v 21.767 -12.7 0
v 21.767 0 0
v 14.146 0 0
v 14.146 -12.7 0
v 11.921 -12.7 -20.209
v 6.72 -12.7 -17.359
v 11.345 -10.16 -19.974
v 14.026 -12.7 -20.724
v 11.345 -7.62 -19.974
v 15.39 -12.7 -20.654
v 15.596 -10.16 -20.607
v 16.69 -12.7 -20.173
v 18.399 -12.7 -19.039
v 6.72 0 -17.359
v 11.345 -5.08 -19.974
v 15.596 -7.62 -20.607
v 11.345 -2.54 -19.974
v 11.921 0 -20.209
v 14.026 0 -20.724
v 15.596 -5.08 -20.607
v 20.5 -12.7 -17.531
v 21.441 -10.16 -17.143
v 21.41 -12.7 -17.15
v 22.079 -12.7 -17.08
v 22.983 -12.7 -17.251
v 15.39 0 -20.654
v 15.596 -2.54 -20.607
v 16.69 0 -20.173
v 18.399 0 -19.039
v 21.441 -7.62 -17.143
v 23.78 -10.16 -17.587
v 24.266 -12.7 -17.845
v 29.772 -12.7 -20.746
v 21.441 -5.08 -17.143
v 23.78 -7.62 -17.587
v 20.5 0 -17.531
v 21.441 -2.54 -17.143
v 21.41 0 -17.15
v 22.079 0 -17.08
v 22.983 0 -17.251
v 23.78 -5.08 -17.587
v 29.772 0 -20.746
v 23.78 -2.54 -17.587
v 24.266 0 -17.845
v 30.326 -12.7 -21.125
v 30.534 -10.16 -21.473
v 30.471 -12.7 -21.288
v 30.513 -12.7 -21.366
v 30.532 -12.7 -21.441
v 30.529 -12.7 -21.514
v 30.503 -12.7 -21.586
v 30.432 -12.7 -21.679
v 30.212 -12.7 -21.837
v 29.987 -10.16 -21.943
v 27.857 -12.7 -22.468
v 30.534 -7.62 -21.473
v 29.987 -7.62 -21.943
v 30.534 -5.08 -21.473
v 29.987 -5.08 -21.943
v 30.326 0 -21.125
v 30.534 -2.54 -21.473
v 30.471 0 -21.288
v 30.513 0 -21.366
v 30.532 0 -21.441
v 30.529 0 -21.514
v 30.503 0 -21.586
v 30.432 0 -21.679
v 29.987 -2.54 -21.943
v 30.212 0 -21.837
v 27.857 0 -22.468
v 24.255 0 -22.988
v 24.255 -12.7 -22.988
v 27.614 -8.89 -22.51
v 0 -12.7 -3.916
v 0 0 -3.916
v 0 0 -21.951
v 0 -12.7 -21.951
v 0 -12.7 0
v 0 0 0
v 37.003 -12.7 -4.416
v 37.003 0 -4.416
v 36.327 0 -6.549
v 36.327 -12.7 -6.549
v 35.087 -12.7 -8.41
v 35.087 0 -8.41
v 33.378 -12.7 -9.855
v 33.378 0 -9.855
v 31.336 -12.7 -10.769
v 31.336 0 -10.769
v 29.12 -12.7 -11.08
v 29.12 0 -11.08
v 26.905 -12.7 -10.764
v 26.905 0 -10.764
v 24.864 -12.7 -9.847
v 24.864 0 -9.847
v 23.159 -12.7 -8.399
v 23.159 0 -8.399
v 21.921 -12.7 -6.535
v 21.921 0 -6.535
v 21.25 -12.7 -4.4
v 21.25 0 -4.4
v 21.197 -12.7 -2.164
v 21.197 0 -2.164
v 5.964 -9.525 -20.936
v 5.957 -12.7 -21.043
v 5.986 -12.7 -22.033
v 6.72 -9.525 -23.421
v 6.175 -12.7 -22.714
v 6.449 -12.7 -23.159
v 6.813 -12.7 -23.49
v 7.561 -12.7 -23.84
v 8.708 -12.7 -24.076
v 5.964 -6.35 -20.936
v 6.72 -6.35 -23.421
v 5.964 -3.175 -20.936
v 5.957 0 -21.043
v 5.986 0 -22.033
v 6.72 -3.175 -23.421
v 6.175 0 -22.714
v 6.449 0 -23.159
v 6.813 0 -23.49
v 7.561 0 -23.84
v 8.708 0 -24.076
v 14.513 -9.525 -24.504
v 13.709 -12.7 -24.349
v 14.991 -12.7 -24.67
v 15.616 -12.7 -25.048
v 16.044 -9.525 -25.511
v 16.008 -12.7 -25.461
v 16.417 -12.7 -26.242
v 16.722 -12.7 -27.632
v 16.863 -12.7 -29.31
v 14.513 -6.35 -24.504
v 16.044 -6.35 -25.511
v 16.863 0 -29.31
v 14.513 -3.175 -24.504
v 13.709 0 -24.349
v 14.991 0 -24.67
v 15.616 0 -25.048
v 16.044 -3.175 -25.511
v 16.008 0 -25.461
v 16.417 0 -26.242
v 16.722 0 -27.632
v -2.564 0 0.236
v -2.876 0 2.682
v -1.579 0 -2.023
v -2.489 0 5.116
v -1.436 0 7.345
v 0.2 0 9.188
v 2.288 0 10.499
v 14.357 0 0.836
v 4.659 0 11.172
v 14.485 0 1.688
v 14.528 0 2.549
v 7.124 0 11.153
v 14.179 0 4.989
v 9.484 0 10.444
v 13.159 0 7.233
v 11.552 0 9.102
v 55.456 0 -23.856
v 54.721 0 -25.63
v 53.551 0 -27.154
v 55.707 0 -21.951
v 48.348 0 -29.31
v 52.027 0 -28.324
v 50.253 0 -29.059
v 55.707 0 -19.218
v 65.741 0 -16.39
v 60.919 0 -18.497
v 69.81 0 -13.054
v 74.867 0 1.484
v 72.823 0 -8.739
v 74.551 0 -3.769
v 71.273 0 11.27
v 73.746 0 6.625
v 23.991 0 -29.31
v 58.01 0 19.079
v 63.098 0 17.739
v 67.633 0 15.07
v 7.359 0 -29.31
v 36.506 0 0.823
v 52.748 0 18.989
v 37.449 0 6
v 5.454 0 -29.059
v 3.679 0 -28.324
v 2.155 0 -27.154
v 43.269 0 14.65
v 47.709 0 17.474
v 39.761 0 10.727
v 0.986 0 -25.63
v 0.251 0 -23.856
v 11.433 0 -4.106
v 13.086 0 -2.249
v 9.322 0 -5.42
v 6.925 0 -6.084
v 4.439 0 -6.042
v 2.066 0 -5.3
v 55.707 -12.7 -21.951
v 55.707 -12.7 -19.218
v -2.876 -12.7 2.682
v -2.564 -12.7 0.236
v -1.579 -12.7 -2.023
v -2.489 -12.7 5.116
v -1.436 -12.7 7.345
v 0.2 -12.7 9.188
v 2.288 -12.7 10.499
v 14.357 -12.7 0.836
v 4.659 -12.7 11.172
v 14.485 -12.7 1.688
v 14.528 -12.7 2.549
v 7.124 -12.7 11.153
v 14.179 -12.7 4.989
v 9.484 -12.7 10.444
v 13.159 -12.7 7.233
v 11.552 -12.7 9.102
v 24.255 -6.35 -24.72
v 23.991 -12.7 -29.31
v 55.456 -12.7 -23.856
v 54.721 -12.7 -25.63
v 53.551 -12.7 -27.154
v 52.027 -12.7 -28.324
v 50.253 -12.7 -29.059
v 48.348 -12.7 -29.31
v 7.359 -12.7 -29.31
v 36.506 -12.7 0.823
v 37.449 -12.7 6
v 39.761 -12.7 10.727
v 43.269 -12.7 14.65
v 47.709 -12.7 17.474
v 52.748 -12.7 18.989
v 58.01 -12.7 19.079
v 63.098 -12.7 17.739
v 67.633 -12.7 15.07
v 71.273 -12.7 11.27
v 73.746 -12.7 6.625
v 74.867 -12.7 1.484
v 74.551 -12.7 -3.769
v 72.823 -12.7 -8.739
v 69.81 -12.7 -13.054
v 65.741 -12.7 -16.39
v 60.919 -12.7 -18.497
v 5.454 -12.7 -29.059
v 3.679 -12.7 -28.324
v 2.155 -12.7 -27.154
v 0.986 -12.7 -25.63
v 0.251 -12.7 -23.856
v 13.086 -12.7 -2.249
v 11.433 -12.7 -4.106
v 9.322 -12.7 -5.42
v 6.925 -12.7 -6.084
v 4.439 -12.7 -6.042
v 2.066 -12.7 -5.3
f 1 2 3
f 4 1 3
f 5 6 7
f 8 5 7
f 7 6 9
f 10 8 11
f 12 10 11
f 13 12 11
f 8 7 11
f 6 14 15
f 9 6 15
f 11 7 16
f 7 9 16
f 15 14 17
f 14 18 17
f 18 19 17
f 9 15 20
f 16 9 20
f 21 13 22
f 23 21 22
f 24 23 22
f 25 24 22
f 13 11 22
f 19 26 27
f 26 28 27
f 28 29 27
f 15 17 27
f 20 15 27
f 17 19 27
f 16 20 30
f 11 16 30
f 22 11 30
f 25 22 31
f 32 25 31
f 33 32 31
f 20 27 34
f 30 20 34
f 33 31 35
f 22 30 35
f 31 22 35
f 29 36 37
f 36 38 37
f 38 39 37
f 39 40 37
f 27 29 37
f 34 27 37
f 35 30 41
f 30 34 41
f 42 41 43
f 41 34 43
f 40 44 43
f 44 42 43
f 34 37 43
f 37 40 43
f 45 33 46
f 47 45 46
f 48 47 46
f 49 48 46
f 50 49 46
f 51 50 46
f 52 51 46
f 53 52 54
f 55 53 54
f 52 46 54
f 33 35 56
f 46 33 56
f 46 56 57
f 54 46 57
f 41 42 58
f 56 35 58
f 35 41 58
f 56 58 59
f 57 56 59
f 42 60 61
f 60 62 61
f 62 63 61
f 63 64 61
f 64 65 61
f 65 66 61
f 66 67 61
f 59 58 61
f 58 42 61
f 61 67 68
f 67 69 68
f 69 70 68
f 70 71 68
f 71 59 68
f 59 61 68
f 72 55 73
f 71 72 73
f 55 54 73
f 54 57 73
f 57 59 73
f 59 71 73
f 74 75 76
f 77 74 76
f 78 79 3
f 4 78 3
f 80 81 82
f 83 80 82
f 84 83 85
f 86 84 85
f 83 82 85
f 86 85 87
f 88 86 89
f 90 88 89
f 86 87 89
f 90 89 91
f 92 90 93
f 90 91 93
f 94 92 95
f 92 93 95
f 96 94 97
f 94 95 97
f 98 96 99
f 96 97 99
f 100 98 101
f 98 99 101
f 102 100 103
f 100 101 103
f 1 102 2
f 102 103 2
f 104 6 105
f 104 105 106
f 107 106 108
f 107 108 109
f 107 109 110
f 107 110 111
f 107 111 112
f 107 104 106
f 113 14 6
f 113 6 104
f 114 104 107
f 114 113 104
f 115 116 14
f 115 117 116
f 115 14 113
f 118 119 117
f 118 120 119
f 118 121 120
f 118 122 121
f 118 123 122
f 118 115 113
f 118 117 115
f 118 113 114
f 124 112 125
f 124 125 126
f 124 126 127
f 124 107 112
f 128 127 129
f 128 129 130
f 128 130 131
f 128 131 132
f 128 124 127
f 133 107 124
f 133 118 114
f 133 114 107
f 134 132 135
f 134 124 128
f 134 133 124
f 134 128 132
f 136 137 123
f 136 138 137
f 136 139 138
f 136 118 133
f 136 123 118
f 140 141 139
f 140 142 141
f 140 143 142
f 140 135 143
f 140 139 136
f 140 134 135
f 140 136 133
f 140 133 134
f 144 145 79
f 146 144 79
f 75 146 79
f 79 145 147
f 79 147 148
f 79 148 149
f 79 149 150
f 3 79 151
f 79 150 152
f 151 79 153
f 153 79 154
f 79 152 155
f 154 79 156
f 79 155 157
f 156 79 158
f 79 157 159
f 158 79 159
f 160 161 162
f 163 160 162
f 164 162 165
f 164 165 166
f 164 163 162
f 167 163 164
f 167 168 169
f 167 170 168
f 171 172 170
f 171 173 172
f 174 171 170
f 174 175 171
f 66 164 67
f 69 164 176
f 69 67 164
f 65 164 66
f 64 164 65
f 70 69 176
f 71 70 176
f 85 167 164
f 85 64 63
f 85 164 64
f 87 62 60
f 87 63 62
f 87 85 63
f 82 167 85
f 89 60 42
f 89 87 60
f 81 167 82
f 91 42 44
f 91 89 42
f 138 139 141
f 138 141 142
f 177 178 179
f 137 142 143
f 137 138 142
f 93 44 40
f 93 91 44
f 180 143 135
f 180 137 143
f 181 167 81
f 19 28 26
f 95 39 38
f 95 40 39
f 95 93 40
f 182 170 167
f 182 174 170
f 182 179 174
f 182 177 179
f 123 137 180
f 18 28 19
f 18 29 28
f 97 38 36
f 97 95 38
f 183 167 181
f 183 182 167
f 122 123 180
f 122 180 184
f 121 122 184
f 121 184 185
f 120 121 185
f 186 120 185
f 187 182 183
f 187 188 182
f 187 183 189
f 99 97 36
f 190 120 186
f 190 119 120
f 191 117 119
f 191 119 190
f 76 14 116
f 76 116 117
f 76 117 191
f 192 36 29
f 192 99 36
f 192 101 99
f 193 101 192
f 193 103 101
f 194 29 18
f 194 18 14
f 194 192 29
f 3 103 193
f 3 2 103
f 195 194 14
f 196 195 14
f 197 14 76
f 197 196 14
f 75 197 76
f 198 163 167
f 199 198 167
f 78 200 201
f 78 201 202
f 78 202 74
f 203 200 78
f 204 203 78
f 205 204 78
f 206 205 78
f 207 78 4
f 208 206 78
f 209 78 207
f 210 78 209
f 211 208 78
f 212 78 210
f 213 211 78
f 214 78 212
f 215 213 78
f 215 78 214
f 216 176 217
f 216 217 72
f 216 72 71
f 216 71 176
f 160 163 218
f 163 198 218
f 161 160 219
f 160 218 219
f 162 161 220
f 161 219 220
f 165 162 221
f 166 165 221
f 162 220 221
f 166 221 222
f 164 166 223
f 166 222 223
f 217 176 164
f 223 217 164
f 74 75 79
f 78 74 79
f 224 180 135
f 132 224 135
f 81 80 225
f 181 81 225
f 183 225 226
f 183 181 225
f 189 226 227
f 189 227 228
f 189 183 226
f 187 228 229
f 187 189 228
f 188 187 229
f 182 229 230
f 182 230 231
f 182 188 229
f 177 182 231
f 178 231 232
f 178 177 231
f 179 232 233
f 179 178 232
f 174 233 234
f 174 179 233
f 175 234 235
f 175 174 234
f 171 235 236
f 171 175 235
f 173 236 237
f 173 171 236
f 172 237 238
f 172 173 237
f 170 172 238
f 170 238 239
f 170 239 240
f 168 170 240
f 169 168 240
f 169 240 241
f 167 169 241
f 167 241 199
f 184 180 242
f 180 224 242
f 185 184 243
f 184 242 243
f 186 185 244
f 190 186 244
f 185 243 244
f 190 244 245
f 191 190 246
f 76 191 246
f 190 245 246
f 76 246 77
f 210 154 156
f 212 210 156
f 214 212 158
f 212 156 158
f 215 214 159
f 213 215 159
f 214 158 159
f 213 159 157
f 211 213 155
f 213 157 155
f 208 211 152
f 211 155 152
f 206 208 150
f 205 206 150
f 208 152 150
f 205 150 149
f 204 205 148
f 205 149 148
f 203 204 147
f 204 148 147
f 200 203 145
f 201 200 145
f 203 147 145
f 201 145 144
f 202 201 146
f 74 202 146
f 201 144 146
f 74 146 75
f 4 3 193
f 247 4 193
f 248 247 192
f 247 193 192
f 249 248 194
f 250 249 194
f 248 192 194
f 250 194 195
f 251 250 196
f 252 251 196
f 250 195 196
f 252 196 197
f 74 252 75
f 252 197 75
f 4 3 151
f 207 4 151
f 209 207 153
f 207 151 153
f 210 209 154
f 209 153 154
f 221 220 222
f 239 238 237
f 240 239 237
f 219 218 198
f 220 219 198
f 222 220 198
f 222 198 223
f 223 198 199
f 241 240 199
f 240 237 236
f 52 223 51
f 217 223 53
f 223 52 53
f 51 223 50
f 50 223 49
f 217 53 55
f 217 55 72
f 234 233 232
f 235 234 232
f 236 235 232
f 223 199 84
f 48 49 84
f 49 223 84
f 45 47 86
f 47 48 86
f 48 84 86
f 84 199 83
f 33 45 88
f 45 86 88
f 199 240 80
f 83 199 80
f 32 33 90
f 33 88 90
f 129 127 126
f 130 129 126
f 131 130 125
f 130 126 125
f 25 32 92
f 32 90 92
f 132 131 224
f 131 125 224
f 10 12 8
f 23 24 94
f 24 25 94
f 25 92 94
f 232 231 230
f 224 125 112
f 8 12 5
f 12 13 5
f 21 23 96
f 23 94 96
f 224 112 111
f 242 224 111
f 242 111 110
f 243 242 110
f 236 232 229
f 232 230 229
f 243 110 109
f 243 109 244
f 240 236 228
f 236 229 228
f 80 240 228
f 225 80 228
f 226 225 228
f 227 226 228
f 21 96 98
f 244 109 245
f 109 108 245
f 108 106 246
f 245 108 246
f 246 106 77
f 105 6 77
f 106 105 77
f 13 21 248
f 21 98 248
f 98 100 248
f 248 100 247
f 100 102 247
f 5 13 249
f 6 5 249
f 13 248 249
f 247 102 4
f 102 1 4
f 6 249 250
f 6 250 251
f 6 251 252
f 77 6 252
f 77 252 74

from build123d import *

# Parameters (mm, degrees)
F1_DEPTH  = 12.7
F2_DEPTH  = 12.7
F1_FACE_W = 19.2178485011
F1_FACE_H = 12.7
F4_R      = 7.3585229381


with BuildPart() as f1:
    # F0 (on Front) → F1 (new body)
    with BuildSketch(Plane.XZ):
        with BuildLine():
            Line((21.76652076, 0), (14.1461283629, 0))
            ThreePointArc((14.1461283629, 0), (8.1471688821, -5.8381114015), (0, -3.9159514716))
            Line((0, -3.9159514716), (0, -29.3096937239))
            Line((0, -29.3096937239), (16.8631964923, -29.3096937239))
            add(Edge.make_bspline(
                [(6.7195226438, -17.3593014479), (6.0482608246, -19.8654321823), (4.6122151952, -25.226854484), (15.1761402918, -23.4549753557), (16.6600562787, -26.2592916888), (16.8186052548, -28.6004949065), (16.8631964923, -29.3096937239)],
                knots=[0, 0, 0, 0, 0.1314169135, 0.2811431826, 0.3817228814, 0.4231323385, 0.4231323385, 0.4231323385, 0.4231323385], degree=3))
            add(Edge.make_bspline(
                [(6.7195226438, -17.3593014479), (9.8450413842, -19.3230399979), (15.6205872382, -22.9517694931), (21.3430002266, -15.355293975), (25.846211657, -19.2329189543), (33.2053726167, -21.8108203864), (27.3871203601, -22.5761607042), (24.2554172873, -22.9881089181)],
                knots=[0, 0, 0, 0, 0.2417916305, 0.4467990005, 0.6286614728, 0.8001251999, 1, 1, 1, 1], degree=3))
            add(Edge.make_bspline(
                [(23.9913668796, -29.3096937239), (24.2124863664, -27.570233309), (24.268194033, -24.5781198499), (24.2591819925, -23.4566102565), (24.2554172873, -22.9881089181)],
                knots=[0.8318451759, 0.8318451759, 0.8318451759, 0.8318451759, 0.9297547158, 1, 1, 1, 1], degree=3))
            Line((23.9913668796, -29.3096937239), (55.7066202164, -29.3096937239))
            Line((55.7066202164, -29.3096937239), (55.7066202164, 0))
            Line((55.7066202164, 0), (36.4887717152, 0))
            ThreePointArc((36.4887717152, 0), (36.9553014972, -1.5162544523), (37.11288462, -3.0948123895))
            ThreePointArc((37.11288462, -3.0948123895), (27.5490883005, -10.922467649), (21.76652076, 0))
        make_face()
    extrude(amount=F1_DEPTH)

    # F1_face (on face) → F3 (revolve)
    with BuildSketch(Plane(origin=(46.0976959658, -6.35, 0), x_dir=(1, 0, 0), z_dir=(0, 0, 1))):
        Rectangle(F1_FACE_W, F1_FACE_H)
    revolve(axis=Axis((55.7066202164, -6.35, 0), (0, 1, 0)))

    # F4
    f4_edges = [f1.edges().sort_by_distance(p)[0] for p in [
        (55.70662, -6.35, -29.309694),
        (0, -6.35, -29.309694),
    ]]
    fillet(f4_edges, radius=F4_R)


with BuildPart() as f2:
    # F0 (on Front) → F2 (new body)
    with BuildSketch(Plane.XZ):
        with BuildLine():
            Line((0, -3.9159514716), (0, 0))
            Line((0, 0), (14.1461283629, 0))
            ThreePointArc((14.1461283629, 0), (14.4317915571, 1.2601305638), (14.5277175631, 2.5486687664))
            ThreePointArc((14.5277175631, 2.5486687664), (2.2876444422, 10.4992330925), (0, -3.9159514716))
        make_face()
    extrude(amount=F2_DEPTH)


solid = Compound([f1.part, f2.part])
